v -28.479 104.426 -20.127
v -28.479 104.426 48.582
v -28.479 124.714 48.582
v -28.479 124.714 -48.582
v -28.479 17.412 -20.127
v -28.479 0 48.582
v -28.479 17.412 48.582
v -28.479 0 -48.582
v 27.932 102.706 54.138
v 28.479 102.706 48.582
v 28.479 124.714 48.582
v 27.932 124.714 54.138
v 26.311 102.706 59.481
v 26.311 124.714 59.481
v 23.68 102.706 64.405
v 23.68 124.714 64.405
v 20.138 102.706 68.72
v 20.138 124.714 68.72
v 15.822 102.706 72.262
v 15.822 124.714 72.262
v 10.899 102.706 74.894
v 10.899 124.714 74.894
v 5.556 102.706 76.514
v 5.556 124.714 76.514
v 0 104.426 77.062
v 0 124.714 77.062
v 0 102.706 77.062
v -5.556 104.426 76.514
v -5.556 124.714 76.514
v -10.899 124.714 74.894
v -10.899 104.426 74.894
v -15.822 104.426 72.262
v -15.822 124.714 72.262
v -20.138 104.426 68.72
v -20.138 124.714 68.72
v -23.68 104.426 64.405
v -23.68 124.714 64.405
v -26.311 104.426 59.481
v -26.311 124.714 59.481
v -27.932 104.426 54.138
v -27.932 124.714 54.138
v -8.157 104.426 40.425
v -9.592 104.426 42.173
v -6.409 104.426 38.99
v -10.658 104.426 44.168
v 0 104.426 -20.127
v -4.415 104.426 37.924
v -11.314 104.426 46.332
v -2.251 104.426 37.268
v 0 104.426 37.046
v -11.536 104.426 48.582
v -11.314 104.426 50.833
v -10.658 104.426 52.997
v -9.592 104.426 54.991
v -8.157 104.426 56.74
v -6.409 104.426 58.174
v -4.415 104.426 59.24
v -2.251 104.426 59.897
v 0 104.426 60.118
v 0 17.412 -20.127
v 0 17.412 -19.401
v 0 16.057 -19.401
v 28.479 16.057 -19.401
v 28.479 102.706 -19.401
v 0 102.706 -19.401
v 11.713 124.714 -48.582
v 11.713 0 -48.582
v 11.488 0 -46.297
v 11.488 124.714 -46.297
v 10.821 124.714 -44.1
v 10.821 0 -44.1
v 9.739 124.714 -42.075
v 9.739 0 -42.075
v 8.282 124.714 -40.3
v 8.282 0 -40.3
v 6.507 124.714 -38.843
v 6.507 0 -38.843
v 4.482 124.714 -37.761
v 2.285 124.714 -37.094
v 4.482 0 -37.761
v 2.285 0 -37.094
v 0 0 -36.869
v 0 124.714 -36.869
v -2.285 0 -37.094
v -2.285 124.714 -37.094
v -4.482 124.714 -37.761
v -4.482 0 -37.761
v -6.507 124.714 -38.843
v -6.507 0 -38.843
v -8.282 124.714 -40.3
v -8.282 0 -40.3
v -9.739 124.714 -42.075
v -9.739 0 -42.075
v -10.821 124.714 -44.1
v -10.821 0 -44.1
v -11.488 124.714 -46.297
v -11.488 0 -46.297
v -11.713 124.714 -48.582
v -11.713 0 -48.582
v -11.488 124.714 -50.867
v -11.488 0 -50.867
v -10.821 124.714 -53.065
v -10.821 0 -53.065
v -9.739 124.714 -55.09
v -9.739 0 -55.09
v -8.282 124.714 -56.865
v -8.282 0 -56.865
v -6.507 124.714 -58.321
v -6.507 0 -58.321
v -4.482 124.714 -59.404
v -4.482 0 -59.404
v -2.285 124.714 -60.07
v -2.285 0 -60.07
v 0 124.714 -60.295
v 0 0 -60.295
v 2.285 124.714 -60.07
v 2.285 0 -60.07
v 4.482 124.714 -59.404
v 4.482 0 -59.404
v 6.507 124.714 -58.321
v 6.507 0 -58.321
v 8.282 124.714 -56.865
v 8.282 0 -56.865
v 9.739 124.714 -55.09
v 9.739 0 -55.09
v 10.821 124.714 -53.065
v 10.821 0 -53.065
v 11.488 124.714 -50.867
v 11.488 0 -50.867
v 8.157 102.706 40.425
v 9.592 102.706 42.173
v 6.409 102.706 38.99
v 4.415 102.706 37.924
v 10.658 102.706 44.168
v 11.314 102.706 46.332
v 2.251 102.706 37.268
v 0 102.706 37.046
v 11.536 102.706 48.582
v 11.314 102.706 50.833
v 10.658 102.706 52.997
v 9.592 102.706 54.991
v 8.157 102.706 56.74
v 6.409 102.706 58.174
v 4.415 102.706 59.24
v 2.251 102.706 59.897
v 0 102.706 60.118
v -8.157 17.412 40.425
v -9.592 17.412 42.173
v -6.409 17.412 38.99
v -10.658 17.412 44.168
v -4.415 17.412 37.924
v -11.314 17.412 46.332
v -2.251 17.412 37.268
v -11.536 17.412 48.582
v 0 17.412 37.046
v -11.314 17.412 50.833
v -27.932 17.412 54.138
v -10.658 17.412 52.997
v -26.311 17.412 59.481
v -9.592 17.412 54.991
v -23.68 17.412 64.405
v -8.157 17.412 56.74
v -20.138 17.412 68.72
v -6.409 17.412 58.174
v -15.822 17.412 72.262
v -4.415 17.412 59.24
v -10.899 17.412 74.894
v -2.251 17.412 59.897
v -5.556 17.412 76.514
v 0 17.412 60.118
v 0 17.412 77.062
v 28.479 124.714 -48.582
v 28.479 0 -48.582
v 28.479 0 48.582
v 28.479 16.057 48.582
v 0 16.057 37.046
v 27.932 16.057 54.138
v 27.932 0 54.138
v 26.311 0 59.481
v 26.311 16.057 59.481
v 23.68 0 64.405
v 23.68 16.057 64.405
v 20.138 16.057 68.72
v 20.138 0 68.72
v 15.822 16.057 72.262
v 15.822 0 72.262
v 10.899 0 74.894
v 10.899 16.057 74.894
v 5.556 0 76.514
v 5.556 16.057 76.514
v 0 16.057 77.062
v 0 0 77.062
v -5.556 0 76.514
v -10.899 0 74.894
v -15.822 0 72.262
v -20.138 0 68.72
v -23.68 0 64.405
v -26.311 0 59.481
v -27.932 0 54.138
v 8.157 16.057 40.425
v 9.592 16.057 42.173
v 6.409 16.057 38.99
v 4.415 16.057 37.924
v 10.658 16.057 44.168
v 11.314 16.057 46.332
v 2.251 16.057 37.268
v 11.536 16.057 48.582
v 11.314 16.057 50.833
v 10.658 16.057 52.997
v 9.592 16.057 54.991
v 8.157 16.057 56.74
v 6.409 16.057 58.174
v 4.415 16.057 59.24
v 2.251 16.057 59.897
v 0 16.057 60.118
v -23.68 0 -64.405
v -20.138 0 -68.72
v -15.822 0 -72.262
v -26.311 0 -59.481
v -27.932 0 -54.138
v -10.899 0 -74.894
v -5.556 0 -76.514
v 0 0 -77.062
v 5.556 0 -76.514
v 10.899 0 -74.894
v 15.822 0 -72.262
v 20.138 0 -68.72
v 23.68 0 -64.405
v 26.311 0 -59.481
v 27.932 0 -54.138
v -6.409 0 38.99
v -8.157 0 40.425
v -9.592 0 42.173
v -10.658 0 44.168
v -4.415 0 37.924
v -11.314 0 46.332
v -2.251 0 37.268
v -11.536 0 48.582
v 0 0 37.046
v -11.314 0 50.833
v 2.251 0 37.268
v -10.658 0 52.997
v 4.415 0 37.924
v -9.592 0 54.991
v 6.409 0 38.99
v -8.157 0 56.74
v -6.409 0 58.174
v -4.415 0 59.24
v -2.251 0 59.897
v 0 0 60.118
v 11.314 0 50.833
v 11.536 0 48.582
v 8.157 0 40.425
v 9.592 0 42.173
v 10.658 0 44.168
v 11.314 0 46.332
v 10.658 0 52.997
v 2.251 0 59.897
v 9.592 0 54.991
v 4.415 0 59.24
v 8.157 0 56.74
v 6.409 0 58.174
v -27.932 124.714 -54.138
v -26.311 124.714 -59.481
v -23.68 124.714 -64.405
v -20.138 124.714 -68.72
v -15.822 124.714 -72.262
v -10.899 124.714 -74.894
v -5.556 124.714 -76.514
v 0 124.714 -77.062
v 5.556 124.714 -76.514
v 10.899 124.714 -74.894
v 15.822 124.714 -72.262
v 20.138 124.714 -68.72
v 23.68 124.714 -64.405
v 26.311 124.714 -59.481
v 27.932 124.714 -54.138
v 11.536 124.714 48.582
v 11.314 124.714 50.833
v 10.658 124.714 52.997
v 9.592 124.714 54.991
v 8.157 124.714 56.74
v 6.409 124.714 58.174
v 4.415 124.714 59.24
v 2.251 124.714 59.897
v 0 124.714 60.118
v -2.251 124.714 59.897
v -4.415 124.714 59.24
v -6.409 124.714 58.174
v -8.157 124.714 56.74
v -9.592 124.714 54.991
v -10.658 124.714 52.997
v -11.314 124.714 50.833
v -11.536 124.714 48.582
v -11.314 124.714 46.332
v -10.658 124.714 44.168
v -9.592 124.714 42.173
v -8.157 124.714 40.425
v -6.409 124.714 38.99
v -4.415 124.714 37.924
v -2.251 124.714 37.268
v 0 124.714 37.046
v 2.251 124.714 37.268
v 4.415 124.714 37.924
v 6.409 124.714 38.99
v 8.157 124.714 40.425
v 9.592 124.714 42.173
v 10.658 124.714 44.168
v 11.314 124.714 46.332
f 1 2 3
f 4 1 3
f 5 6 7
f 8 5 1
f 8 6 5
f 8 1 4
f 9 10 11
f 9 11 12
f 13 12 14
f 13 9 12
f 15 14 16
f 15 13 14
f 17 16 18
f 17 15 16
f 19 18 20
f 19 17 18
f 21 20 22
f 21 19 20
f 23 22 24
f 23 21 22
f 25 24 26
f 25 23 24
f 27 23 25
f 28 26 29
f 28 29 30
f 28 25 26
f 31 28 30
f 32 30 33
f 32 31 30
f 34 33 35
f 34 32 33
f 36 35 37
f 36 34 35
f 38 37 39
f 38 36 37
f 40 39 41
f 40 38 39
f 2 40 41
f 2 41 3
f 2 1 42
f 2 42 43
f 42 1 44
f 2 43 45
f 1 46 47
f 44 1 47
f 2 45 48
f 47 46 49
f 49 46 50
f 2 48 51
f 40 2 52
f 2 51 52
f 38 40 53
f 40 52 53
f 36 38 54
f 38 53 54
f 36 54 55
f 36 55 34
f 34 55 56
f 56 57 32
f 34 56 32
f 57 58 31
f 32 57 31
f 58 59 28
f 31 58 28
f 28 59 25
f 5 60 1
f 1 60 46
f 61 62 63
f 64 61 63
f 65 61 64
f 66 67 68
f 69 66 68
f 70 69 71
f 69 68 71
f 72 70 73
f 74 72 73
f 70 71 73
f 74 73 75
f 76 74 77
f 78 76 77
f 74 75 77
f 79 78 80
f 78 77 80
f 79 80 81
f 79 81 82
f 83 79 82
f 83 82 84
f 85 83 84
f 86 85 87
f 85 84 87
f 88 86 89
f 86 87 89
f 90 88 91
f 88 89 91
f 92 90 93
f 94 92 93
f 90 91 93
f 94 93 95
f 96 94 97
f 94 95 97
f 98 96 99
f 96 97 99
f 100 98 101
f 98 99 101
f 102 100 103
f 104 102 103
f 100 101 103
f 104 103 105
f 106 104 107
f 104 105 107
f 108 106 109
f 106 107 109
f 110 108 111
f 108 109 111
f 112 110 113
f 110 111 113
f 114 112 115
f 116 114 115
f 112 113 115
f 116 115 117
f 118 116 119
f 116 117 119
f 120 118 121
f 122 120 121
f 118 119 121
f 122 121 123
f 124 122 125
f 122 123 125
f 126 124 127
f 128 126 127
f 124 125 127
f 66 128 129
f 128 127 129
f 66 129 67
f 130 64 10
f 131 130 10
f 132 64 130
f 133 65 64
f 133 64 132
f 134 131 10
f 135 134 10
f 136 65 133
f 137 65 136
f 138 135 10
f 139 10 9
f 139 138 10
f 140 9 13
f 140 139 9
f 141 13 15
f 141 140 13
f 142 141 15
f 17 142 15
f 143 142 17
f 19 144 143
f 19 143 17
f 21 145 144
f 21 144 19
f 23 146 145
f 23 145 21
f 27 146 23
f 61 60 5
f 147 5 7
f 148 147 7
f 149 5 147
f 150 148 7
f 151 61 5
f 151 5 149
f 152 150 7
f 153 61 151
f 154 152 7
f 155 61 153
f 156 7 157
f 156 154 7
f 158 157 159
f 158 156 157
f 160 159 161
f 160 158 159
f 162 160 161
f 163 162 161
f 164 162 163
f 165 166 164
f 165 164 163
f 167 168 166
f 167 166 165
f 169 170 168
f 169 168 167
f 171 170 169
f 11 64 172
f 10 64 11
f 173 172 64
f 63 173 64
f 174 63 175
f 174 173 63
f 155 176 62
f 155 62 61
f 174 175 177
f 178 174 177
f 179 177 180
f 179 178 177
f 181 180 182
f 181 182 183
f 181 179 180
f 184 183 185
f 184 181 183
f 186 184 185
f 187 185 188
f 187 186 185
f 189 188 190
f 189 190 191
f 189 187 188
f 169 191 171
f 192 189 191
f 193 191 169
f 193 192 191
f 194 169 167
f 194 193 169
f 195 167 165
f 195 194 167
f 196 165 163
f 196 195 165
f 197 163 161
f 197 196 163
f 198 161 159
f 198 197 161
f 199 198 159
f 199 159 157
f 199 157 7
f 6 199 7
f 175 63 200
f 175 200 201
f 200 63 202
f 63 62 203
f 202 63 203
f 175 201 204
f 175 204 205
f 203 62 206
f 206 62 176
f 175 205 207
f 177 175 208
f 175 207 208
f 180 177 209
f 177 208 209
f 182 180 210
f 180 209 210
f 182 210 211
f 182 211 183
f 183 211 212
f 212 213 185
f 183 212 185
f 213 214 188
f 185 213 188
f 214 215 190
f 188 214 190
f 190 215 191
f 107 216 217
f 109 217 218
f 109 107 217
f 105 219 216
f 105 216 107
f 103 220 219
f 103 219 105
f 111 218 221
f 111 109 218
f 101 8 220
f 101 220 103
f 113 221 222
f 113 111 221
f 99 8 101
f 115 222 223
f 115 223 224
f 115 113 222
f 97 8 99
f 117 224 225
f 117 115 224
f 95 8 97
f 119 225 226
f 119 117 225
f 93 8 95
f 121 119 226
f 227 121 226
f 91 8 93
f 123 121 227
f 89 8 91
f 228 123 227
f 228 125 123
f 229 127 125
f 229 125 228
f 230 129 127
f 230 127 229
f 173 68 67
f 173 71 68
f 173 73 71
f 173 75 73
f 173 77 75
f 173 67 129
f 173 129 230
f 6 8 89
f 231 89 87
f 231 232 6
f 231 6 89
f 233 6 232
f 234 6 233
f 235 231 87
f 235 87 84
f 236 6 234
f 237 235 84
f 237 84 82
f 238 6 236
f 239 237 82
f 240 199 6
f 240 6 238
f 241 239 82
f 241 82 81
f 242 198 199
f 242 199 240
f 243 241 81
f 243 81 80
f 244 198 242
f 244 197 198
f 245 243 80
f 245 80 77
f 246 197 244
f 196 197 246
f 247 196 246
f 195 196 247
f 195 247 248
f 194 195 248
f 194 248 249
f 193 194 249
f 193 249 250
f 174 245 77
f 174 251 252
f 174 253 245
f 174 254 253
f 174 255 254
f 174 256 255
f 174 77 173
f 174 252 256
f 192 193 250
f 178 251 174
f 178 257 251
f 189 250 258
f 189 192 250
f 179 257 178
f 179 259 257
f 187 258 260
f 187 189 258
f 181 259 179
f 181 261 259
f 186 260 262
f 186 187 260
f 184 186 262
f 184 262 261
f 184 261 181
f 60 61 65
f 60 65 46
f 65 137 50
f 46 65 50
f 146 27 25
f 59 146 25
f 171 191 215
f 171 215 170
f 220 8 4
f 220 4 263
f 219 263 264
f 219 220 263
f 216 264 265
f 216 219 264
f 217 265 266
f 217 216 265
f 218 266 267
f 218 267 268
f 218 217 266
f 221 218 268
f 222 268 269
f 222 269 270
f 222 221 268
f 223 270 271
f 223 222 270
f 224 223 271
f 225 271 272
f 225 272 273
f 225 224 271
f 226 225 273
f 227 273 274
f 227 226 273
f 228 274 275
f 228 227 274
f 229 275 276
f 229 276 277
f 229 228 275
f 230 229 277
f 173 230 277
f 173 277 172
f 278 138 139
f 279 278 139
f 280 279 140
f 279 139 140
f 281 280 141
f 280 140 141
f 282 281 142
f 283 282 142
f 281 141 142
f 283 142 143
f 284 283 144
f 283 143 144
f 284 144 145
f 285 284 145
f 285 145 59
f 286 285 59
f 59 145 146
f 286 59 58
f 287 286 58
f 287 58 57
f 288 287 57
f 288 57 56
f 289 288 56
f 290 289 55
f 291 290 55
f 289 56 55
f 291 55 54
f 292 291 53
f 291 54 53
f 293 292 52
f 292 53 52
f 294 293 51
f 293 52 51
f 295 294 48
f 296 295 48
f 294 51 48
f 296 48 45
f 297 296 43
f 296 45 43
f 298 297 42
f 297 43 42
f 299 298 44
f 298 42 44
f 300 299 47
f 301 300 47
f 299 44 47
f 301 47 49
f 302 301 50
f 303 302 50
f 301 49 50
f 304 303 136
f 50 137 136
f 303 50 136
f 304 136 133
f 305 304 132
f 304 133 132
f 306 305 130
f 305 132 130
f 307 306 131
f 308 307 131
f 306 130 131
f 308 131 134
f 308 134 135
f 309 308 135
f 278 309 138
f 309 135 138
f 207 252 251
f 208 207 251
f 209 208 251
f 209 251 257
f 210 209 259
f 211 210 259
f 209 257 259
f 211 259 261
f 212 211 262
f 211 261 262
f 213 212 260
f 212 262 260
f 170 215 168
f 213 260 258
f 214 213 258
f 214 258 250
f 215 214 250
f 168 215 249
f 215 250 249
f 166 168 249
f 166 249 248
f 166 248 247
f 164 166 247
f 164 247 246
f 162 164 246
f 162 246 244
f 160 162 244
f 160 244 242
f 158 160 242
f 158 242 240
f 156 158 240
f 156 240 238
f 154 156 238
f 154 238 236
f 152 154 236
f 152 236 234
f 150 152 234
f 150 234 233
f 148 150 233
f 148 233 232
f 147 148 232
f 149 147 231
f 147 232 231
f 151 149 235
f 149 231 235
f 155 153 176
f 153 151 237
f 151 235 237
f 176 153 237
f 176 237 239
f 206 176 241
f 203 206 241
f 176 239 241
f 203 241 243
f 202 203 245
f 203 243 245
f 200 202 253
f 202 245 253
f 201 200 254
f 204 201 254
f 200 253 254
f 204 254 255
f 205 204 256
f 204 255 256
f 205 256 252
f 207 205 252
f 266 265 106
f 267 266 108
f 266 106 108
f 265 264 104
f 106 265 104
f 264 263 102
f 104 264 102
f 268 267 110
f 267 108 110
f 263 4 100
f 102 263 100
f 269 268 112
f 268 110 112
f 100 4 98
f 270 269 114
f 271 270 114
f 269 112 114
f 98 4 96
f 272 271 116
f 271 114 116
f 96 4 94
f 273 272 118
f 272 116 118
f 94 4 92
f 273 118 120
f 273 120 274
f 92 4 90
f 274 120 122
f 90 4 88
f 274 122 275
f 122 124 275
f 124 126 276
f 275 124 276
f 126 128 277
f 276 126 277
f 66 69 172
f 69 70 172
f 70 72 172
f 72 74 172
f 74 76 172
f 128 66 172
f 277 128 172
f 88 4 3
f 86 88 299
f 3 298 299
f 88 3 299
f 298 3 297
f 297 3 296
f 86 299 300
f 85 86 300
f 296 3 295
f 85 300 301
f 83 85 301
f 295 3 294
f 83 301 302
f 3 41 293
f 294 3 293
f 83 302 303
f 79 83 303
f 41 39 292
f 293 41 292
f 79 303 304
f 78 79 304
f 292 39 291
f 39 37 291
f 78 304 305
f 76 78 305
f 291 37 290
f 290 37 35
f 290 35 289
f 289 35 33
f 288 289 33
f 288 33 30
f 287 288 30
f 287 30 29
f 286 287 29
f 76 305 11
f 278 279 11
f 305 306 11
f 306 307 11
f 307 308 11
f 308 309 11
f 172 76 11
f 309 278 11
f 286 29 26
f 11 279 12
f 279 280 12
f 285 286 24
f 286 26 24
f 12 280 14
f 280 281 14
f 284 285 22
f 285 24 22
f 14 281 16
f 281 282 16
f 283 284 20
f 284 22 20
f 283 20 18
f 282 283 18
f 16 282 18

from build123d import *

# Parameters (mm, degrees)
F0_R     = 11.712963
F0_R_2   = 11.53605
F1_DEPTH = 124.714
F2_W     = 87.013735
F2_H     = 97.314427
F3_DEPTH = 28.480272
F4_W     = 86.64881
F4_H     = 97.130336
F5_DEPTH = 28.480272


with BuildPart() as f1:
    # F0 (on Front) → F1 (new body)
    with BuildSketch(Plane.XZ):
        with BuildLine():
            ThreePointArc((-28.479272, -48.582289), (0, -77.061562), (28.479272, -48.582289))
            Line((28.479272, -48.582289), (28.479272, 48.582289))
            ThreePointArc((28.479272, 48.582289), (0, 77.061562), (-28.479272, 48.582289))
            Line((-28.479272, 48.582289), (-28.479272, -48.582289))
        make_face()
        with Locations((0, -48.582289)):
            Circle(F0_R, mode=Mode.SUBTRACT)
        with Locations((0, 48.582289)):
            Circle(F0_R_2, mode=Mode.SUBTRACT)
    extrude(amount=-F1_DEPTH)

    # F2 (on Right) → F3 (cut, through all)
    with BuildSketch(Plane.YZ):
        with Locations((60.919331, 28.530205)):
            Rectangle(F2_W, F2_H)
    extrude(amount=-F3_DEPTH, mode=Mode.SUBTRACT)

    # F4 (on Right) → F5 (cut, through all)
    with BuildSketch(Plane.YZ):
        with Locations((59.381513, 29.164385)):
            Rectangle(F4_W, F4_H)
    extrude(amount=F5_DEPTH, mode=Mode.SUBTRACT)


solid = f1.part
